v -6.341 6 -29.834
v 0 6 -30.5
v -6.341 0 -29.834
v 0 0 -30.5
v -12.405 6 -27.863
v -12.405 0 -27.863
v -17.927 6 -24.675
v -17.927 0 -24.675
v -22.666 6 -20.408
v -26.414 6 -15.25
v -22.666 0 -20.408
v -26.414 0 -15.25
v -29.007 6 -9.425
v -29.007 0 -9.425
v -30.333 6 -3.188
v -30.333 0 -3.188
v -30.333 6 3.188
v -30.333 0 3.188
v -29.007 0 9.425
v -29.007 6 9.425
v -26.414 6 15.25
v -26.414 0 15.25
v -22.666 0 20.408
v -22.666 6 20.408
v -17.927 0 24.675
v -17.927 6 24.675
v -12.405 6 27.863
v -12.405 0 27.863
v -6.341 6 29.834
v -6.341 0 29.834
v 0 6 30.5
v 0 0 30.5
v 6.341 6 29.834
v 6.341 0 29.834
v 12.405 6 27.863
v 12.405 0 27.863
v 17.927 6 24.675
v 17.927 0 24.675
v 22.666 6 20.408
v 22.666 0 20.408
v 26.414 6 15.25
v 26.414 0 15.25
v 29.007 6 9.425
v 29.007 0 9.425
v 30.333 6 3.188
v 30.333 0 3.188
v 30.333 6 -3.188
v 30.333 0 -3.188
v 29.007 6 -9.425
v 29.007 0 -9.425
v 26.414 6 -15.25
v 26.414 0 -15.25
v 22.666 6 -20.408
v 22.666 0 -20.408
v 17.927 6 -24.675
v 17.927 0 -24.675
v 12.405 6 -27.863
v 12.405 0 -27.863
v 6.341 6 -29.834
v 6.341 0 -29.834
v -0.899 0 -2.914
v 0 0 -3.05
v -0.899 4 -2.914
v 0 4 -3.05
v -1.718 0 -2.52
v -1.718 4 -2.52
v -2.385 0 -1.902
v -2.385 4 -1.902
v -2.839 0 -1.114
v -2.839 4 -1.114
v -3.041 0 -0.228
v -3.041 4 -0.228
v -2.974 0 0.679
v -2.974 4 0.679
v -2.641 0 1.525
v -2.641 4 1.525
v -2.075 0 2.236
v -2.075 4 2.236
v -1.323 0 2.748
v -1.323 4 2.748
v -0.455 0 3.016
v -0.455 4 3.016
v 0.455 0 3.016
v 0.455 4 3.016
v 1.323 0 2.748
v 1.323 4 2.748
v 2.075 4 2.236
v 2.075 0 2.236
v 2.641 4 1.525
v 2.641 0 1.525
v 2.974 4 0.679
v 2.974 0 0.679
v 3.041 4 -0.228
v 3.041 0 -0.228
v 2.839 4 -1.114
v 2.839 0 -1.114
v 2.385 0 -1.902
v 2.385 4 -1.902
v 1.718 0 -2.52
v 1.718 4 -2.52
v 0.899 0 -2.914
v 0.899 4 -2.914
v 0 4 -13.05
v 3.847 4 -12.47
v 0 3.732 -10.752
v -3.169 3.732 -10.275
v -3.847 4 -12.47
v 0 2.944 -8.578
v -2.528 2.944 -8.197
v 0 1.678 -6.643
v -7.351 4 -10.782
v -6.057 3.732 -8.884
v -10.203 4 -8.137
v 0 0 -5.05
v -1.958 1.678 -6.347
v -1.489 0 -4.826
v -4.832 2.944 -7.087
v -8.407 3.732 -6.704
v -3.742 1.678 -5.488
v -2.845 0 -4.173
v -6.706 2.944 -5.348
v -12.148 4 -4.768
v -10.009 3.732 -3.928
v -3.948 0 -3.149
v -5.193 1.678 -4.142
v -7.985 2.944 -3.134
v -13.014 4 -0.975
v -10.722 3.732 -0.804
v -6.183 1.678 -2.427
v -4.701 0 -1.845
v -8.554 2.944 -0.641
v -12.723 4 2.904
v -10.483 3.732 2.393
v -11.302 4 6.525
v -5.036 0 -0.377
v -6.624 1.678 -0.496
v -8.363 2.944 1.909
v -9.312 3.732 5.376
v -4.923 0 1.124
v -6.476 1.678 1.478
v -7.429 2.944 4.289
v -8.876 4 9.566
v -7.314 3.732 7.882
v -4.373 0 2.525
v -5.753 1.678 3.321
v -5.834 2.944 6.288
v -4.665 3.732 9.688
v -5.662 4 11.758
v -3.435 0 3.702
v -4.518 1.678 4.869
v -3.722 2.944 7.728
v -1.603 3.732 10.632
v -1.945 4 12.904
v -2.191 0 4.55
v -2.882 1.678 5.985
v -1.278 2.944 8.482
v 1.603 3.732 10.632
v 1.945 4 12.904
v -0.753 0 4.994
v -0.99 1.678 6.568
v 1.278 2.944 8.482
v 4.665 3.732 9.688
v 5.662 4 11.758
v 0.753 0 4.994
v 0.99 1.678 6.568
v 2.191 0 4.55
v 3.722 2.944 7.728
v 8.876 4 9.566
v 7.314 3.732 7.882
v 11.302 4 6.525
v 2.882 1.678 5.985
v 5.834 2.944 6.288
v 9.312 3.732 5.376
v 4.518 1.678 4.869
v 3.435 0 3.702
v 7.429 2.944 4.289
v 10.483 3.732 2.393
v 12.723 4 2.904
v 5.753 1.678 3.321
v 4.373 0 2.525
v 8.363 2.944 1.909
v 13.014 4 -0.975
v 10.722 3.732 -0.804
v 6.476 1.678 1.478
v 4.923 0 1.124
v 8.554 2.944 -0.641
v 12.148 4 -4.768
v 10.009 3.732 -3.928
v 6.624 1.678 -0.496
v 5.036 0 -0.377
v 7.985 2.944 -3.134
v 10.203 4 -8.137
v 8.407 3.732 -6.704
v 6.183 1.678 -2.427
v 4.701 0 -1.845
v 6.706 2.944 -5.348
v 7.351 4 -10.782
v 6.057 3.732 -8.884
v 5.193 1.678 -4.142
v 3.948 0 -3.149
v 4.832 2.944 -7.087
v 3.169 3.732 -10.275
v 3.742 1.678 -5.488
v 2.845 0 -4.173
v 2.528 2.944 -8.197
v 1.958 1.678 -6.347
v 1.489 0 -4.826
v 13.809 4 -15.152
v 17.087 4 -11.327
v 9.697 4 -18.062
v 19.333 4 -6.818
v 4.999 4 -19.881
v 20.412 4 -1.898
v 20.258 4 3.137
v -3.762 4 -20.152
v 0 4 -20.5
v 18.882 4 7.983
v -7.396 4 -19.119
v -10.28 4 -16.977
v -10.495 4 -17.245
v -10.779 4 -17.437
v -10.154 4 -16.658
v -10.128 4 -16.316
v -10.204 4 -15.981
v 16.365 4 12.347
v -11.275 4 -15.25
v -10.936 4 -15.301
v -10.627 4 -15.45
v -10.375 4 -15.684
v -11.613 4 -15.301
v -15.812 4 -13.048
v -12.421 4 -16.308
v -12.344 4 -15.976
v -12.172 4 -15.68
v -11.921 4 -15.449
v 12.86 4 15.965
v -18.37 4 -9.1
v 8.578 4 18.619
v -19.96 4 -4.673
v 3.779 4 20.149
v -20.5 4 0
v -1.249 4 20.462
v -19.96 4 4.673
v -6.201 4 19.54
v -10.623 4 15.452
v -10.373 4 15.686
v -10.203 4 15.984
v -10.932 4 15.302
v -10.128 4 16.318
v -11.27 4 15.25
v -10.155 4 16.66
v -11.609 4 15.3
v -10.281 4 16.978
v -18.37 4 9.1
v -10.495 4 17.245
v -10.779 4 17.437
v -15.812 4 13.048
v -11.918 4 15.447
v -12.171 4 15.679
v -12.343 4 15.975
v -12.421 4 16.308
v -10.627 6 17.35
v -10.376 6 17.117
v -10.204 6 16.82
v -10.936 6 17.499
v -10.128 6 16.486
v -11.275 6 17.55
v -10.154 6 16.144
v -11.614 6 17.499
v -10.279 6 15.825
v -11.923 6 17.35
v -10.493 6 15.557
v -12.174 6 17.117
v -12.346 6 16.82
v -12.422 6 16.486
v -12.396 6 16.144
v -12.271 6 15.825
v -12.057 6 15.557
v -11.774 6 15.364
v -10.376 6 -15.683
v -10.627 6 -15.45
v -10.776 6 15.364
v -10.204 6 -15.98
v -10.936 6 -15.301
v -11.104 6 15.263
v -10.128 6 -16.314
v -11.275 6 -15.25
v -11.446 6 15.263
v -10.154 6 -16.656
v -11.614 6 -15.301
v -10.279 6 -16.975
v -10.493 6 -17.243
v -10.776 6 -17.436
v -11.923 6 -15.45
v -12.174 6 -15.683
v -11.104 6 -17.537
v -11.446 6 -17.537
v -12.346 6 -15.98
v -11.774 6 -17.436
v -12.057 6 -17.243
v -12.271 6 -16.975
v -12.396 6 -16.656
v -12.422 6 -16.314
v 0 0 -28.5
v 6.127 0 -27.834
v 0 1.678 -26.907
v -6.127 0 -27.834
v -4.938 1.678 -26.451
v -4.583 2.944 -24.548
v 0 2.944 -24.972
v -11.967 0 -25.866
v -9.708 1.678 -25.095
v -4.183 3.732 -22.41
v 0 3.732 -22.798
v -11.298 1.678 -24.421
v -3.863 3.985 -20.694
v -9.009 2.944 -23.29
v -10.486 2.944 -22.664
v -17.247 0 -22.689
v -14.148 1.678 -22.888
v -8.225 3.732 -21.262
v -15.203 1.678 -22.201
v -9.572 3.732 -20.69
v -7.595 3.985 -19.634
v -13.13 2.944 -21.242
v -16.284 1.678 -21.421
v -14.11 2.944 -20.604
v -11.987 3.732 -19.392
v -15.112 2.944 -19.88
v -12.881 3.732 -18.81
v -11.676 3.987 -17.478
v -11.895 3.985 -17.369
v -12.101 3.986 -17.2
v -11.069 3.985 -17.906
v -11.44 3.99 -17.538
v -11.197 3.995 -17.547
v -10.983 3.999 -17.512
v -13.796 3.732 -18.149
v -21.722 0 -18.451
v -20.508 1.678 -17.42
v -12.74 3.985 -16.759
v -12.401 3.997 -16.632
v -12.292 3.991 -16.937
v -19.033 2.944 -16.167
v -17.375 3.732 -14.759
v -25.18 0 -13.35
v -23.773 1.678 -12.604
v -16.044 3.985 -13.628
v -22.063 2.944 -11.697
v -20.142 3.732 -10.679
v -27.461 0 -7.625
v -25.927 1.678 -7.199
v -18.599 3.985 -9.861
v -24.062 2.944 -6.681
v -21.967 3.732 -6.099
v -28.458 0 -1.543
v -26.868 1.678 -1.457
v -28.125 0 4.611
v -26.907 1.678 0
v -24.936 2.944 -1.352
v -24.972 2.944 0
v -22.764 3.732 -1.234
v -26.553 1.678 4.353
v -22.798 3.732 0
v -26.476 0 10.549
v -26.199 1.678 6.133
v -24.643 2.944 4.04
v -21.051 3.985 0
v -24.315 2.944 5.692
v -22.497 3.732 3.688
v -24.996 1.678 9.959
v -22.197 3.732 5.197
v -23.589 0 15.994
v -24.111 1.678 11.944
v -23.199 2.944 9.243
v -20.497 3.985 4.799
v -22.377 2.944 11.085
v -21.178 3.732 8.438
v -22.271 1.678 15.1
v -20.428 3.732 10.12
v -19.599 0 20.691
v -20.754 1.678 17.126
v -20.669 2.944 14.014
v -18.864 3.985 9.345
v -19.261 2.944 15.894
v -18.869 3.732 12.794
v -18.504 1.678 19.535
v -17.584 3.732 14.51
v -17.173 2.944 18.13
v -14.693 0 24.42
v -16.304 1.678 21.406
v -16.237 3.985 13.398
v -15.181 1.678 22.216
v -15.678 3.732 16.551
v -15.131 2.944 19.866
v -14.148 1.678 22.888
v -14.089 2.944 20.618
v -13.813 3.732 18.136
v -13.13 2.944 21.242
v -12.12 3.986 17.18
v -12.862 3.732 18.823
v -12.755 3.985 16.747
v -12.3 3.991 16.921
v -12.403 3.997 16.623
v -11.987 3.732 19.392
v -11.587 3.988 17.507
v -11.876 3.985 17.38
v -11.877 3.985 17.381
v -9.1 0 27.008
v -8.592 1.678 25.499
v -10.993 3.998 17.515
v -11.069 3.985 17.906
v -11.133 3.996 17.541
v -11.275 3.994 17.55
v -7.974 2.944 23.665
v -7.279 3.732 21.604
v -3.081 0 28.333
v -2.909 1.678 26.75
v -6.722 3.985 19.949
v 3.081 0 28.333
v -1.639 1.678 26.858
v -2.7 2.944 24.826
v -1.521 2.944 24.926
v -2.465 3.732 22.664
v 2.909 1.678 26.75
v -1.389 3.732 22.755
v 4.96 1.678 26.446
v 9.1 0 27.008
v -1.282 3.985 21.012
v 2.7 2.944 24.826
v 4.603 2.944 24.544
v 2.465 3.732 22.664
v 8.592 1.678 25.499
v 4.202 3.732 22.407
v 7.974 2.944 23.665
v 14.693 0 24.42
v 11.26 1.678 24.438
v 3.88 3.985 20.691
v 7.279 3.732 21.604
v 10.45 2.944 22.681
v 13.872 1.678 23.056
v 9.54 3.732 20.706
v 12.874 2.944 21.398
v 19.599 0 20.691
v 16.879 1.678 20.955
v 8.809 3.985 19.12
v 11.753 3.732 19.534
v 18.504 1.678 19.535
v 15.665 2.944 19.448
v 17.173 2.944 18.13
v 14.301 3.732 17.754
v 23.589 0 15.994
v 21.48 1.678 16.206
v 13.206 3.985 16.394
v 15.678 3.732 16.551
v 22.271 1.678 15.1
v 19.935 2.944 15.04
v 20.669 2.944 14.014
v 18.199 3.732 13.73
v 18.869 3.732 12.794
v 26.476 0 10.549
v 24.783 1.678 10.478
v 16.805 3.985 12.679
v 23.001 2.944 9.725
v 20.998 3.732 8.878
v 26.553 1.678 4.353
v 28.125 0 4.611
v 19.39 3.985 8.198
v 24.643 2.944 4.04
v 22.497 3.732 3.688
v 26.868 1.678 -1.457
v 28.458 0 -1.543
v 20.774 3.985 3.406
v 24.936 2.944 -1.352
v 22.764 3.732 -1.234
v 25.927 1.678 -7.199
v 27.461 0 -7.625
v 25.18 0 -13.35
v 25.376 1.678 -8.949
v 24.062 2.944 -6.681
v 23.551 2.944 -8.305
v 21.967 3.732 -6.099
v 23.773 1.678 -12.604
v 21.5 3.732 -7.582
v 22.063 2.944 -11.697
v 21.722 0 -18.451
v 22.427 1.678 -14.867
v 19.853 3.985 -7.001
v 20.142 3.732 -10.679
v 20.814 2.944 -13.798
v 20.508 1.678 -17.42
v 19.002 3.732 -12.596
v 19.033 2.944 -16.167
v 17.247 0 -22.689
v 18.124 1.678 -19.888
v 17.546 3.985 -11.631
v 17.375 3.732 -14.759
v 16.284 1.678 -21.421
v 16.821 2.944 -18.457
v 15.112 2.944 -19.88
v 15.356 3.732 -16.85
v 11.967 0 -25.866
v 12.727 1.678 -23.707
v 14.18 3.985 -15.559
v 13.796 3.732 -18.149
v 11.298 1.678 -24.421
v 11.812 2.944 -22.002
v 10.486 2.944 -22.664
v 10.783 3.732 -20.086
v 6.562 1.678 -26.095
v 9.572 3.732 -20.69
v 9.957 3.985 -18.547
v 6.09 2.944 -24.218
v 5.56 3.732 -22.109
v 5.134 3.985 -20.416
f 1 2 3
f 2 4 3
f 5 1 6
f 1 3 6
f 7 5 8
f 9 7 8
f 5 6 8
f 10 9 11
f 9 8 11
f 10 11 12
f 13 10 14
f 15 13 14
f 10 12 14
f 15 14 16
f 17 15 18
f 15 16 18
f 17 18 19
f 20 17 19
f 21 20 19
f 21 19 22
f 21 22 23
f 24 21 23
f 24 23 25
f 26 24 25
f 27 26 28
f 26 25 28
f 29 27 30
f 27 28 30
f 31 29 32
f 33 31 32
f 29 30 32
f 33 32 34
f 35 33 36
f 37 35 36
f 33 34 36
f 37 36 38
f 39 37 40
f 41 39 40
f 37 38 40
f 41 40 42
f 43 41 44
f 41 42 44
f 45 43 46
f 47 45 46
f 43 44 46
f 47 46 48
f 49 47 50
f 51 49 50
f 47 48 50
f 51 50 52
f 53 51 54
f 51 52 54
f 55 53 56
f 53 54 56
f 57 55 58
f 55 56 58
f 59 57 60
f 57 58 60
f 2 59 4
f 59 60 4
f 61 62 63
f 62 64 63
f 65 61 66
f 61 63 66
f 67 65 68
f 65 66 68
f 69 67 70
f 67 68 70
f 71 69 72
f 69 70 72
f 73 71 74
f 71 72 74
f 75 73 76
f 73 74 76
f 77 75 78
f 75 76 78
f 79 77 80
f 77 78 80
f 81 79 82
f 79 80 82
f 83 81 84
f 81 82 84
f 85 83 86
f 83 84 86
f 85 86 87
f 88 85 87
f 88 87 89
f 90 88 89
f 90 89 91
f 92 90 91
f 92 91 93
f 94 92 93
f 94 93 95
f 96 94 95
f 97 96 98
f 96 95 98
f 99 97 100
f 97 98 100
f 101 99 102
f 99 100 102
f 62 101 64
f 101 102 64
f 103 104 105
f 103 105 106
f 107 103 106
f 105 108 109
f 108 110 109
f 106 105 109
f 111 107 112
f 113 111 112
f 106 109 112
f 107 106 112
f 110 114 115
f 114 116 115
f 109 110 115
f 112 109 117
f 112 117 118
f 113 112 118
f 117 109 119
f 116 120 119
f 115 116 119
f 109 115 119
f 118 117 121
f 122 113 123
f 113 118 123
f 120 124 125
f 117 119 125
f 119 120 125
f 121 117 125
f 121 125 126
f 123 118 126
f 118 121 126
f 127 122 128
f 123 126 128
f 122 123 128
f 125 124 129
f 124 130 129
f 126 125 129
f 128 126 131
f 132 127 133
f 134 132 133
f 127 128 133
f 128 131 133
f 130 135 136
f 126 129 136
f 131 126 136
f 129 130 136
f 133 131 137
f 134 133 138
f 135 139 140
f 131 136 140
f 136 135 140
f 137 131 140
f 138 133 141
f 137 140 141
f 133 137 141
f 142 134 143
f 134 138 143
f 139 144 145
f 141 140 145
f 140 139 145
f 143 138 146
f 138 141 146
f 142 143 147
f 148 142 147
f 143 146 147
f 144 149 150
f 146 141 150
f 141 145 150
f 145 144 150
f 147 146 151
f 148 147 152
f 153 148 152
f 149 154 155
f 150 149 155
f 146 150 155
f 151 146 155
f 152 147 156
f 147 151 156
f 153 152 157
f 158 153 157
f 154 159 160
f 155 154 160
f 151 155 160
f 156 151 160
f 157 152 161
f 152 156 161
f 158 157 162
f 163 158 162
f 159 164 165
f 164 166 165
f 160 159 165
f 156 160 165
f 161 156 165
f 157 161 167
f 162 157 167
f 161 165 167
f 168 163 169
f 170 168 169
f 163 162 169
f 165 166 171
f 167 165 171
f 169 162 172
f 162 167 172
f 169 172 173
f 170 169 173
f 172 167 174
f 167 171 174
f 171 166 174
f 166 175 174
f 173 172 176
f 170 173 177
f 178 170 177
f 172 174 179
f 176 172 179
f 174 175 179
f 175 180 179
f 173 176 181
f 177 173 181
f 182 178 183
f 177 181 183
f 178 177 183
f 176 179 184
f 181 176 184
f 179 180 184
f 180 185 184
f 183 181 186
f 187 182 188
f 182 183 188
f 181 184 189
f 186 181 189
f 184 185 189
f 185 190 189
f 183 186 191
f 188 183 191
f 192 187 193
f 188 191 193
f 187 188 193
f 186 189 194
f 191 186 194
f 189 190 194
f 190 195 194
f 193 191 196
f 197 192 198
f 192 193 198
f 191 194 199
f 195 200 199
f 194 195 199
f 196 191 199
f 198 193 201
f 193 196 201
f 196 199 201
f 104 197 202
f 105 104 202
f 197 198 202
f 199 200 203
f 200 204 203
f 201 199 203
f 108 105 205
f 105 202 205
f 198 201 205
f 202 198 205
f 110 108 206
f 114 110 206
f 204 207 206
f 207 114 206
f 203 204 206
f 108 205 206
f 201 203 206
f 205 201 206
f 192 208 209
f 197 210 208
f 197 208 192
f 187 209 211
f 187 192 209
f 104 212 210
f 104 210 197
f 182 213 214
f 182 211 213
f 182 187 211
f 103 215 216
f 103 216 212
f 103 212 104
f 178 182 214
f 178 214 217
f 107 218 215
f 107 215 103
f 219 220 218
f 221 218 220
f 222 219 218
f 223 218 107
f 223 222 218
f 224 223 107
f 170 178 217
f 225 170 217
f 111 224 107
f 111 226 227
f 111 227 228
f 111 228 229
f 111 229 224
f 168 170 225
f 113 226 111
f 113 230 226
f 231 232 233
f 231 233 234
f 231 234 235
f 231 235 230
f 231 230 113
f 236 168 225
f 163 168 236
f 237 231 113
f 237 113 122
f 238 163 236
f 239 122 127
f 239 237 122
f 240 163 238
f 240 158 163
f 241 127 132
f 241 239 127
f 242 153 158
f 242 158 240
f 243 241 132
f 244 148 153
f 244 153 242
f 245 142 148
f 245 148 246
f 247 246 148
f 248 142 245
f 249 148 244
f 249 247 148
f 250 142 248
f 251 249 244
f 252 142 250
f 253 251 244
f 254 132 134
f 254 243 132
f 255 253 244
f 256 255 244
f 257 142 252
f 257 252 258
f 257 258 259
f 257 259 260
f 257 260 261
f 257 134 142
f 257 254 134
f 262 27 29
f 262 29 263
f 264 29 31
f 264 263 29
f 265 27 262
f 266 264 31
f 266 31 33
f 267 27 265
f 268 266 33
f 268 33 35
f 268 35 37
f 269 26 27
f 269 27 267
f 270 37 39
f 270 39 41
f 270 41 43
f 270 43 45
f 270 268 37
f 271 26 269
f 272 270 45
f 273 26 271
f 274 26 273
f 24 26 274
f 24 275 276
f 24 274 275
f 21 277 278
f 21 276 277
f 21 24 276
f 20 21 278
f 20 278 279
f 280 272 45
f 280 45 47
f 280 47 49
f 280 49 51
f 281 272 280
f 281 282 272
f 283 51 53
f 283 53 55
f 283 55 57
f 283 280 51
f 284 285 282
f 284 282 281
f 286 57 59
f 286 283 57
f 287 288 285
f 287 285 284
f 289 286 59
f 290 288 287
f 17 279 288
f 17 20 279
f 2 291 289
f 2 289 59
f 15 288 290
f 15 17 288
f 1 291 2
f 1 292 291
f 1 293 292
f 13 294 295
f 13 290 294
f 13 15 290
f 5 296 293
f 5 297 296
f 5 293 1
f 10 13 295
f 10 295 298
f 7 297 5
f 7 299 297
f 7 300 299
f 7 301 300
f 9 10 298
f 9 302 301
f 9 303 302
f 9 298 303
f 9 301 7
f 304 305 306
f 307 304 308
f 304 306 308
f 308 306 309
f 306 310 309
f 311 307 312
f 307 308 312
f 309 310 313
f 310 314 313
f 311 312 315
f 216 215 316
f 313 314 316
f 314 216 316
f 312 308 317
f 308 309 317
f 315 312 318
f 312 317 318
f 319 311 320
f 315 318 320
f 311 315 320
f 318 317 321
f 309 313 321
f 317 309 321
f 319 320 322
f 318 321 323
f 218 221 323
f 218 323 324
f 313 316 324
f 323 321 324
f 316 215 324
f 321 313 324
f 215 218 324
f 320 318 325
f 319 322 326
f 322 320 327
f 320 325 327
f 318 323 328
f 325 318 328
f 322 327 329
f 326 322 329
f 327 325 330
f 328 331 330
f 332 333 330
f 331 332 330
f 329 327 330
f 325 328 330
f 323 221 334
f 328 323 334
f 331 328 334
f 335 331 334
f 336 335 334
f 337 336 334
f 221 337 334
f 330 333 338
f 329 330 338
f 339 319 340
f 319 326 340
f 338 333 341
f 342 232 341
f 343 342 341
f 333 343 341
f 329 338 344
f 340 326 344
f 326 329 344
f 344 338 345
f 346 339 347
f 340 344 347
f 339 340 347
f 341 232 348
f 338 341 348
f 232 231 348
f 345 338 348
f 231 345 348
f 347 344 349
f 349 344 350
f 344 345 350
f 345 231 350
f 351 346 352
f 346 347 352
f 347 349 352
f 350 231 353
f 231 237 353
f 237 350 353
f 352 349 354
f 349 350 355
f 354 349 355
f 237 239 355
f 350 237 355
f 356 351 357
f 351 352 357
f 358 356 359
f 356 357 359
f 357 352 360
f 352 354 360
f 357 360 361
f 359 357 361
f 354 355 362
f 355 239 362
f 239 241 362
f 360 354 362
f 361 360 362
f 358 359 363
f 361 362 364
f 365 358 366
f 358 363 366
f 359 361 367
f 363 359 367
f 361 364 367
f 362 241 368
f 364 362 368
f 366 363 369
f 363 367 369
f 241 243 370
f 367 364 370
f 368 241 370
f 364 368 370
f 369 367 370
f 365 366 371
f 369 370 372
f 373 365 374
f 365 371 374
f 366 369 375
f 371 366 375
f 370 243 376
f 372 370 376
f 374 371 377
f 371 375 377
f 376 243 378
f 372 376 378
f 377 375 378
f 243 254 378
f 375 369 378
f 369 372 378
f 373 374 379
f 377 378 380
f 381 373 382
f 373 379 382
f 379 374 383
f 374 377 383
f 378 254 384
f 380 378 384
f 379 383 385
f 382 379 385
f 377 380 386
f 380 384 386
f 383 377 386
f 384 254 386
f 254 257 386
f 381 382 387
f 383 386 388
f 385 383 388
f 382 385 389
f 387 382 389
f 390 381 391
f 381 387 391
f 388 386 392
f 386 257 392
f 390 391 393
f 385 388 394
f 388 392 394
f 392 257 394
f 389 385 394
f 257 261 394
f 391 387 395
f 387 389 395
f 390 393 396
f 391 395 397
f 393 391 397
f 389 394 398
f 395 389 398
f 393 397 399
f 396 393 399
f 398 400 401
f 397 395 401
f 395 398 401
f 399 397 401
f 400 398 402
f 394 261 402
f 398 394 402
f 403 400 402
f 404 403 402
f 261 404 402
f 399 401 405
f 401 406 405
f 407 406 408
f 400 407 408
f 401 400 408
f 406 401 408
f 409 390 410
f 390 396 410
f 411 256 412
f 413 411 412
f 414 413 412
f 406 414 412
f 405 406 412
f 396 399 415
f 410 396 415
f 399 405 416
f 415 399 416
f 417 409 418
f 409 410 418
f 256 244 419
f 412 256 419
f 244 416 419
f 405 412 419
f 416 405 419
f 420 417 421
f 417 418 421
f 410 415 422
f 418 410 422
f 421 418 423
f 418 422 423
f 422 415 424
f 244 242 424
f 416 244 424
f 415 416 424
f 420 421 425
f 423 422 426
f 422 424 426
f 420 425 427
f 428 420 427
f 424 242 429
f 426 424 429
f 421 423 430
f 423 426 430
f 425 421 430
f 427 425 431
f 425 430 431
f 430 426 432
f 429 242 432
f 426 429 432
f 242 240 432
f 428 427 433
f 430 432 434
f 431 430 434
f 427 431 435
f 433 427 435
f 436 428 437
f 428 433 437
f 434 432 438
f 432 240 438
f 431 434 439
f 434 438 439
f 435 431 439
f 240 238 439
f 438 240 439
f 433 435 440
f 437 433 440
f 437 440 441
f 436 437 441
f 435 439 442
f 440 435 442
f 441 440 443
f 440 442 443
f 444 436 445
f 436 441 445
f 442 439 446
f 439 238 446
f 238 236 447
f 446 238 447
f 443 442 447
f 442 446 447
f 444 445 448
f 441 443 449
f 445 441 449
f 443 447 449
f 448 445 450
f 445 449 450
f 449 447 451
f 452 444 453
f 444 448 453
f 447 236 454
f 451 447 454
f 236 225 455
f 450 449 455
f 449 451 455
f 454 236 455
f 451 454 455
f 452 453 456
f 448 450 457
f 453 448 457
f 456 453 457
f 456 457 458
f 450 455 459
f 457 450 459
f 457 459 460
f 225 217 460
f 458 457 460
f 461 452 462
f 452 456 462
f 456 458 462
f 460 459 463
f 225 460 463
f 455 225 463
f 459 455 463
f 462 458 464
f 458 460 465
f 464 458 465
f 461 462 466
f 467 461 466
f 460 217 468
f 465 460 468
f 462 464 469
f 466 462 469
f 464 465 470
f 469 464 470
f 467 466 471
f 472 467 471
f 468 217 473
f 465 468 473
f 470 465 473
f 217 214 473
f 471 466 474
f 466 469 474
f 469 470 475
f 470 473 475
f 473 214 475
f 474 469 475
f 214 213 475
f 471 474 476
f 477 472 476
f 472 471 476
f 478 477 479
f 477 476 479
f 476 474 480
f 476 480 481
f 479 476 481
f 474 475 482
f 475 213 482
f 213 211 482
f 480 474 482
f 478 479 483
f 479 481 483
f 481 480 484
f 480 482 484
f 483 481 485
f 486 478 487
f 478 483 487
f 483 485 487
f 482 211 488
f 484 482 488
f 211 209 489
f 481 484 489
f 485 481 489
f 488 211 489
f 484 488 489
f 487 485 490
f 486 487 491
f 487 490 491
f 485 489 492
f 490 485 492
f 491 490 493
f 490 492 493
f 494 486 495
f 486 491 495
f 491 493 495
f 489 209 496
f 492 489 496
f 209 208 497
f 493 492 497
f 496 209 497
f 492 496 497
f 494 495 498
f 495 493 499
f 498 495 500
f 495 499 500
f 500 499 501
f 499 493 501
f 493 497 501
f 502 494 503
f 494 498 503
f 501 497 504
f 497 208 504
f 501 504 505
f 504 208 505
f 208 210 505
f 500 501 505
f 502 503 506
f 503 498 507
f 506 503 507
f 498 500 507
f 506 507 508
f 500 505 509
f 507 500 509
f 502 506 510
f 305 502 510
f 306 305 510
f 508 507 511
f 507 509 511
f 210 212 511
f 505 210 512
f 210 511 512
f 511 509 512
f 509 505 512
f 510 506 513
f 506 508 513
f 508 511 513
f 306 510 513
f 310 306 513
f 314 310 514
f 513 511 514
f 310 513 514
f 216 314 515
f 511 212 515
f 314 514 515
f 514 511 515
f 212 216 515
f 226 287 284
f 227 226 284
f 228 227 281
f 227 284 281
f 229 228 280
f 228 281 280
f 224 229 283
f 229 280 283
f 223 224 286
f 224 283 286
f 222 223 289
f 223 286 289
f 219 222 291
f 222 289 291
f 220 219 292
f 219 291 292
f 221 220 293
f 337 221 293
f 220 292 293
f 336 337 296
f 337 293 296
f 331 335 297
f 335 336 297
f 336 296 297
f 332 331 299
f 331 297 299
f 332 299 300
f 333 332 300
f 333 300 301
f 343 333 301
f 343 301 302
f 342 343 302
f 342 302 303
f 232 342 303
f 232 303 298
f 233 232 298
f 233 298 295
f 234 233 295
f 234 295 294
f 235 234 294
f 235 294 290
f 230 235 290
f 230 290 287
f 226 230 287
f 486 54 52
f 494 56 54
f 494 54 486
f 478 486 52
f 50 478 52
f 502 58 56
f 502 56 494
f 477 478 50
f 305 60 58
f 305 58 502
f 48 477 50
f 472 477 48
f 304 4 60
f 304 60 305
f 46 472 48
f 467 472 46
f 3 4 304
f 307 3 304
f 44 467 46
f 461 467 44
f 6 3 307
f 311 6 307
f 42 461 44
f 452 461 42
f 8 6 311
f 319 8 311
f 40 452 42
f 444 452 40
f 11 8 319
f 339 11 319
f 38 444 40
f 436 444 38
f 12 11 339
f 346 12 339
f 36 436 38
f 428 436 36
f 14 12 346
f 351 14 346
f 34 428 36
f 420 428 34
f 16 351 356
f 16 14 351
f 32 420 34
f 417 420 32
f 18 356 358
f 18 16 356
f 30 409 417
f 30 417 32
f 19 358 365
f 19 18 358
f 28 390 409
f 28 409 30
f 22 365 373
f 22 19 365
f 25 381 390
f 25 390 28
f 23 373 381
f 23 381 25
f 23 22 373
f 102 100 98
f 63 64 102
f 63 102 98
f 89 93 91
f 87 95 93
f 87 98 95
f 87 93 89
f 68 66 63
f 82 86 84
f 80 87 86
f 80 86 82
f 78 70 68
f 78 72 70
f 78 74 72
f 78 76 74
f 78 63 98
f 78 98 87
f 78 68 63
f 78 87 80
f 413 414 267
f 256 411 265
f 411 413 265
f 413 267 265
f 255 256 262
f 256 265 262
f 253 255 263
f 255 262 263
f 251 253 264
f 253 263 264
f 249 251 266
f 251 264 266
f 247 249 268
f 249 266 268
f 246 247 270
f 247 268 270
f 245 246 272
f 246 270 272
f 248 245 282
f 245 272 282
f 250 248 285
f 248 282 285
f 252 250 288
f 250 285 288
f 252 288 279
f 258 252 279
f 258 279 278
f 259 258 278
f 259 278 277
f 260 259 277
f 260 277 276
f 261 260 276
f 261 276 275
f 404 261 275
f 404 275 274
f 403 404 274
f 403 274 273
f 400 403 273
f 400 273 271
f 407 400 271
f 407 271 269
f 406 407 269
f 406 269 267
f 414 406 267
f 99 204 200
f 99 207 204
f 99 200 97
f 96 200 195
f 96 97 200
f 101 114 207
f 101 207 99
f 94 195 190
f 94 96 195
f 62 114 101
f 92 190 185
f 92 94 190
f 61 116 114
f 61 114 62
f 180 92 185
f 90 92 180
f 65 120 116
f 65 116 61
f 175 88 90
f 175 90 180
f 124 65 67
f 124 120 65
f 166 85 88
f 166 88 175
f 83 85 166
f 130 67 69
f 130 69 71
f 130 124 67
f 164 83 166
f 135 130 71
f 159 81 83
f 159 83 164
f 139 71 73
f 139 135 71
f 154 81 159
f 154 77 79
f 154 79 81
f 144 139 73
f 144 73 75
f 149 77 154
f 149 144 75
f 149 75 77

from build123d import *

# Parameters (mm, degrees)
FILLET1_R          = 10
SKETCH6_R          = 1.15
CUT_EXTRUDE1_DEPTH = 10


with BuildPart() as part:
    # Sketch2 → Revolve1 (revolve)
    with BuildSketch(Plane.XY, mode=Mode.PRIVATE) as revolve1_sk:
        Polygon((0, 4), (-3.05, 4), (-3.05, 3), (-3.05, 0), (-5.05, 0), (-5.05, 4), (-28.5, 4), (-28.5, 0), (-30.5, 0), (-30.5, 4), (-30.5, 6), (0, 6), align=None)
    revolve(revolve1_sk.sketch.rotate(Axis((0, 0, 0), (0, 1, 0)), 270), axis=Axis((0, 0, 0), (0, 1, 0)))

    # Fillet1
    # the kernel refuses this fillet: 10 mm, written as the material it adds along each edge
    with BuildSketch(Plane(origin=(0, 4, 0), x_dir=(0, 0, -1), z_dir=(1, 0, 0))) as fillet1_piece_1:
        with BuildLine():
            CenterArc((20.5, -10), FILLET1_R, 36.869897646, 53.130102354)
            Line((28.5, -4), (28.66, -3.88))
            ThreePointArc((28.66, -3.88), (28.7, -2), (28.7, 0))
            Line((28.7, 0), (28.5, 0.2))
            Line((28.5, 0.2), (20.5, 0.2))
            Line((20.5, 0.2), (20.5, 0))
        make_face()
    revolve(axis=Axis((0, 4, 0), (0, 1, 0)))
    with BuildSketch(Plane(origin=(0, 4, 0), x_dir=(0, 0, -1), z_dir=(1, 0, 0))) as fillet1_piece_2:
        with BuildLine():
            CenterArc((13.05, -10), FILLET1_R, 90, 53.130102354)
            Line((13.05, 0), (13.05, 0.2))
            Line((13.05, 0.2), (5.05, 0.2))
            Line((5.05, 0.2), (4.85, 0))
            ThreePointArc((4.85, 0), (4.85, -2), (4.89, -3.88))
            Line((4.89, -3.88), (5.05, -4))
        make_face()
    revolve(axis=Axis((0, 4, 0), (0, 1, 0)))

    # Sketch6 → Cut-Extrude1 (cut)
    with BuildSketch(Plane(origin=(0, 6, 0), x_dir=(1, 0, 0), z_dir=(0, 1, 0))):
        with Locations(Location((-11.275, 16.4, 0), (0, 0, 270))):
            Circle(SKETCH6_R)
        with Locations(Location((-11.275, -16.4, 0), (0, 0, 270))):
            Circle(SKETCH6_R)
    extrude(amount=-CUT_EXTRUDE1_DEPTH, mode=Mode.SUBTRACT)


solid = part.part
